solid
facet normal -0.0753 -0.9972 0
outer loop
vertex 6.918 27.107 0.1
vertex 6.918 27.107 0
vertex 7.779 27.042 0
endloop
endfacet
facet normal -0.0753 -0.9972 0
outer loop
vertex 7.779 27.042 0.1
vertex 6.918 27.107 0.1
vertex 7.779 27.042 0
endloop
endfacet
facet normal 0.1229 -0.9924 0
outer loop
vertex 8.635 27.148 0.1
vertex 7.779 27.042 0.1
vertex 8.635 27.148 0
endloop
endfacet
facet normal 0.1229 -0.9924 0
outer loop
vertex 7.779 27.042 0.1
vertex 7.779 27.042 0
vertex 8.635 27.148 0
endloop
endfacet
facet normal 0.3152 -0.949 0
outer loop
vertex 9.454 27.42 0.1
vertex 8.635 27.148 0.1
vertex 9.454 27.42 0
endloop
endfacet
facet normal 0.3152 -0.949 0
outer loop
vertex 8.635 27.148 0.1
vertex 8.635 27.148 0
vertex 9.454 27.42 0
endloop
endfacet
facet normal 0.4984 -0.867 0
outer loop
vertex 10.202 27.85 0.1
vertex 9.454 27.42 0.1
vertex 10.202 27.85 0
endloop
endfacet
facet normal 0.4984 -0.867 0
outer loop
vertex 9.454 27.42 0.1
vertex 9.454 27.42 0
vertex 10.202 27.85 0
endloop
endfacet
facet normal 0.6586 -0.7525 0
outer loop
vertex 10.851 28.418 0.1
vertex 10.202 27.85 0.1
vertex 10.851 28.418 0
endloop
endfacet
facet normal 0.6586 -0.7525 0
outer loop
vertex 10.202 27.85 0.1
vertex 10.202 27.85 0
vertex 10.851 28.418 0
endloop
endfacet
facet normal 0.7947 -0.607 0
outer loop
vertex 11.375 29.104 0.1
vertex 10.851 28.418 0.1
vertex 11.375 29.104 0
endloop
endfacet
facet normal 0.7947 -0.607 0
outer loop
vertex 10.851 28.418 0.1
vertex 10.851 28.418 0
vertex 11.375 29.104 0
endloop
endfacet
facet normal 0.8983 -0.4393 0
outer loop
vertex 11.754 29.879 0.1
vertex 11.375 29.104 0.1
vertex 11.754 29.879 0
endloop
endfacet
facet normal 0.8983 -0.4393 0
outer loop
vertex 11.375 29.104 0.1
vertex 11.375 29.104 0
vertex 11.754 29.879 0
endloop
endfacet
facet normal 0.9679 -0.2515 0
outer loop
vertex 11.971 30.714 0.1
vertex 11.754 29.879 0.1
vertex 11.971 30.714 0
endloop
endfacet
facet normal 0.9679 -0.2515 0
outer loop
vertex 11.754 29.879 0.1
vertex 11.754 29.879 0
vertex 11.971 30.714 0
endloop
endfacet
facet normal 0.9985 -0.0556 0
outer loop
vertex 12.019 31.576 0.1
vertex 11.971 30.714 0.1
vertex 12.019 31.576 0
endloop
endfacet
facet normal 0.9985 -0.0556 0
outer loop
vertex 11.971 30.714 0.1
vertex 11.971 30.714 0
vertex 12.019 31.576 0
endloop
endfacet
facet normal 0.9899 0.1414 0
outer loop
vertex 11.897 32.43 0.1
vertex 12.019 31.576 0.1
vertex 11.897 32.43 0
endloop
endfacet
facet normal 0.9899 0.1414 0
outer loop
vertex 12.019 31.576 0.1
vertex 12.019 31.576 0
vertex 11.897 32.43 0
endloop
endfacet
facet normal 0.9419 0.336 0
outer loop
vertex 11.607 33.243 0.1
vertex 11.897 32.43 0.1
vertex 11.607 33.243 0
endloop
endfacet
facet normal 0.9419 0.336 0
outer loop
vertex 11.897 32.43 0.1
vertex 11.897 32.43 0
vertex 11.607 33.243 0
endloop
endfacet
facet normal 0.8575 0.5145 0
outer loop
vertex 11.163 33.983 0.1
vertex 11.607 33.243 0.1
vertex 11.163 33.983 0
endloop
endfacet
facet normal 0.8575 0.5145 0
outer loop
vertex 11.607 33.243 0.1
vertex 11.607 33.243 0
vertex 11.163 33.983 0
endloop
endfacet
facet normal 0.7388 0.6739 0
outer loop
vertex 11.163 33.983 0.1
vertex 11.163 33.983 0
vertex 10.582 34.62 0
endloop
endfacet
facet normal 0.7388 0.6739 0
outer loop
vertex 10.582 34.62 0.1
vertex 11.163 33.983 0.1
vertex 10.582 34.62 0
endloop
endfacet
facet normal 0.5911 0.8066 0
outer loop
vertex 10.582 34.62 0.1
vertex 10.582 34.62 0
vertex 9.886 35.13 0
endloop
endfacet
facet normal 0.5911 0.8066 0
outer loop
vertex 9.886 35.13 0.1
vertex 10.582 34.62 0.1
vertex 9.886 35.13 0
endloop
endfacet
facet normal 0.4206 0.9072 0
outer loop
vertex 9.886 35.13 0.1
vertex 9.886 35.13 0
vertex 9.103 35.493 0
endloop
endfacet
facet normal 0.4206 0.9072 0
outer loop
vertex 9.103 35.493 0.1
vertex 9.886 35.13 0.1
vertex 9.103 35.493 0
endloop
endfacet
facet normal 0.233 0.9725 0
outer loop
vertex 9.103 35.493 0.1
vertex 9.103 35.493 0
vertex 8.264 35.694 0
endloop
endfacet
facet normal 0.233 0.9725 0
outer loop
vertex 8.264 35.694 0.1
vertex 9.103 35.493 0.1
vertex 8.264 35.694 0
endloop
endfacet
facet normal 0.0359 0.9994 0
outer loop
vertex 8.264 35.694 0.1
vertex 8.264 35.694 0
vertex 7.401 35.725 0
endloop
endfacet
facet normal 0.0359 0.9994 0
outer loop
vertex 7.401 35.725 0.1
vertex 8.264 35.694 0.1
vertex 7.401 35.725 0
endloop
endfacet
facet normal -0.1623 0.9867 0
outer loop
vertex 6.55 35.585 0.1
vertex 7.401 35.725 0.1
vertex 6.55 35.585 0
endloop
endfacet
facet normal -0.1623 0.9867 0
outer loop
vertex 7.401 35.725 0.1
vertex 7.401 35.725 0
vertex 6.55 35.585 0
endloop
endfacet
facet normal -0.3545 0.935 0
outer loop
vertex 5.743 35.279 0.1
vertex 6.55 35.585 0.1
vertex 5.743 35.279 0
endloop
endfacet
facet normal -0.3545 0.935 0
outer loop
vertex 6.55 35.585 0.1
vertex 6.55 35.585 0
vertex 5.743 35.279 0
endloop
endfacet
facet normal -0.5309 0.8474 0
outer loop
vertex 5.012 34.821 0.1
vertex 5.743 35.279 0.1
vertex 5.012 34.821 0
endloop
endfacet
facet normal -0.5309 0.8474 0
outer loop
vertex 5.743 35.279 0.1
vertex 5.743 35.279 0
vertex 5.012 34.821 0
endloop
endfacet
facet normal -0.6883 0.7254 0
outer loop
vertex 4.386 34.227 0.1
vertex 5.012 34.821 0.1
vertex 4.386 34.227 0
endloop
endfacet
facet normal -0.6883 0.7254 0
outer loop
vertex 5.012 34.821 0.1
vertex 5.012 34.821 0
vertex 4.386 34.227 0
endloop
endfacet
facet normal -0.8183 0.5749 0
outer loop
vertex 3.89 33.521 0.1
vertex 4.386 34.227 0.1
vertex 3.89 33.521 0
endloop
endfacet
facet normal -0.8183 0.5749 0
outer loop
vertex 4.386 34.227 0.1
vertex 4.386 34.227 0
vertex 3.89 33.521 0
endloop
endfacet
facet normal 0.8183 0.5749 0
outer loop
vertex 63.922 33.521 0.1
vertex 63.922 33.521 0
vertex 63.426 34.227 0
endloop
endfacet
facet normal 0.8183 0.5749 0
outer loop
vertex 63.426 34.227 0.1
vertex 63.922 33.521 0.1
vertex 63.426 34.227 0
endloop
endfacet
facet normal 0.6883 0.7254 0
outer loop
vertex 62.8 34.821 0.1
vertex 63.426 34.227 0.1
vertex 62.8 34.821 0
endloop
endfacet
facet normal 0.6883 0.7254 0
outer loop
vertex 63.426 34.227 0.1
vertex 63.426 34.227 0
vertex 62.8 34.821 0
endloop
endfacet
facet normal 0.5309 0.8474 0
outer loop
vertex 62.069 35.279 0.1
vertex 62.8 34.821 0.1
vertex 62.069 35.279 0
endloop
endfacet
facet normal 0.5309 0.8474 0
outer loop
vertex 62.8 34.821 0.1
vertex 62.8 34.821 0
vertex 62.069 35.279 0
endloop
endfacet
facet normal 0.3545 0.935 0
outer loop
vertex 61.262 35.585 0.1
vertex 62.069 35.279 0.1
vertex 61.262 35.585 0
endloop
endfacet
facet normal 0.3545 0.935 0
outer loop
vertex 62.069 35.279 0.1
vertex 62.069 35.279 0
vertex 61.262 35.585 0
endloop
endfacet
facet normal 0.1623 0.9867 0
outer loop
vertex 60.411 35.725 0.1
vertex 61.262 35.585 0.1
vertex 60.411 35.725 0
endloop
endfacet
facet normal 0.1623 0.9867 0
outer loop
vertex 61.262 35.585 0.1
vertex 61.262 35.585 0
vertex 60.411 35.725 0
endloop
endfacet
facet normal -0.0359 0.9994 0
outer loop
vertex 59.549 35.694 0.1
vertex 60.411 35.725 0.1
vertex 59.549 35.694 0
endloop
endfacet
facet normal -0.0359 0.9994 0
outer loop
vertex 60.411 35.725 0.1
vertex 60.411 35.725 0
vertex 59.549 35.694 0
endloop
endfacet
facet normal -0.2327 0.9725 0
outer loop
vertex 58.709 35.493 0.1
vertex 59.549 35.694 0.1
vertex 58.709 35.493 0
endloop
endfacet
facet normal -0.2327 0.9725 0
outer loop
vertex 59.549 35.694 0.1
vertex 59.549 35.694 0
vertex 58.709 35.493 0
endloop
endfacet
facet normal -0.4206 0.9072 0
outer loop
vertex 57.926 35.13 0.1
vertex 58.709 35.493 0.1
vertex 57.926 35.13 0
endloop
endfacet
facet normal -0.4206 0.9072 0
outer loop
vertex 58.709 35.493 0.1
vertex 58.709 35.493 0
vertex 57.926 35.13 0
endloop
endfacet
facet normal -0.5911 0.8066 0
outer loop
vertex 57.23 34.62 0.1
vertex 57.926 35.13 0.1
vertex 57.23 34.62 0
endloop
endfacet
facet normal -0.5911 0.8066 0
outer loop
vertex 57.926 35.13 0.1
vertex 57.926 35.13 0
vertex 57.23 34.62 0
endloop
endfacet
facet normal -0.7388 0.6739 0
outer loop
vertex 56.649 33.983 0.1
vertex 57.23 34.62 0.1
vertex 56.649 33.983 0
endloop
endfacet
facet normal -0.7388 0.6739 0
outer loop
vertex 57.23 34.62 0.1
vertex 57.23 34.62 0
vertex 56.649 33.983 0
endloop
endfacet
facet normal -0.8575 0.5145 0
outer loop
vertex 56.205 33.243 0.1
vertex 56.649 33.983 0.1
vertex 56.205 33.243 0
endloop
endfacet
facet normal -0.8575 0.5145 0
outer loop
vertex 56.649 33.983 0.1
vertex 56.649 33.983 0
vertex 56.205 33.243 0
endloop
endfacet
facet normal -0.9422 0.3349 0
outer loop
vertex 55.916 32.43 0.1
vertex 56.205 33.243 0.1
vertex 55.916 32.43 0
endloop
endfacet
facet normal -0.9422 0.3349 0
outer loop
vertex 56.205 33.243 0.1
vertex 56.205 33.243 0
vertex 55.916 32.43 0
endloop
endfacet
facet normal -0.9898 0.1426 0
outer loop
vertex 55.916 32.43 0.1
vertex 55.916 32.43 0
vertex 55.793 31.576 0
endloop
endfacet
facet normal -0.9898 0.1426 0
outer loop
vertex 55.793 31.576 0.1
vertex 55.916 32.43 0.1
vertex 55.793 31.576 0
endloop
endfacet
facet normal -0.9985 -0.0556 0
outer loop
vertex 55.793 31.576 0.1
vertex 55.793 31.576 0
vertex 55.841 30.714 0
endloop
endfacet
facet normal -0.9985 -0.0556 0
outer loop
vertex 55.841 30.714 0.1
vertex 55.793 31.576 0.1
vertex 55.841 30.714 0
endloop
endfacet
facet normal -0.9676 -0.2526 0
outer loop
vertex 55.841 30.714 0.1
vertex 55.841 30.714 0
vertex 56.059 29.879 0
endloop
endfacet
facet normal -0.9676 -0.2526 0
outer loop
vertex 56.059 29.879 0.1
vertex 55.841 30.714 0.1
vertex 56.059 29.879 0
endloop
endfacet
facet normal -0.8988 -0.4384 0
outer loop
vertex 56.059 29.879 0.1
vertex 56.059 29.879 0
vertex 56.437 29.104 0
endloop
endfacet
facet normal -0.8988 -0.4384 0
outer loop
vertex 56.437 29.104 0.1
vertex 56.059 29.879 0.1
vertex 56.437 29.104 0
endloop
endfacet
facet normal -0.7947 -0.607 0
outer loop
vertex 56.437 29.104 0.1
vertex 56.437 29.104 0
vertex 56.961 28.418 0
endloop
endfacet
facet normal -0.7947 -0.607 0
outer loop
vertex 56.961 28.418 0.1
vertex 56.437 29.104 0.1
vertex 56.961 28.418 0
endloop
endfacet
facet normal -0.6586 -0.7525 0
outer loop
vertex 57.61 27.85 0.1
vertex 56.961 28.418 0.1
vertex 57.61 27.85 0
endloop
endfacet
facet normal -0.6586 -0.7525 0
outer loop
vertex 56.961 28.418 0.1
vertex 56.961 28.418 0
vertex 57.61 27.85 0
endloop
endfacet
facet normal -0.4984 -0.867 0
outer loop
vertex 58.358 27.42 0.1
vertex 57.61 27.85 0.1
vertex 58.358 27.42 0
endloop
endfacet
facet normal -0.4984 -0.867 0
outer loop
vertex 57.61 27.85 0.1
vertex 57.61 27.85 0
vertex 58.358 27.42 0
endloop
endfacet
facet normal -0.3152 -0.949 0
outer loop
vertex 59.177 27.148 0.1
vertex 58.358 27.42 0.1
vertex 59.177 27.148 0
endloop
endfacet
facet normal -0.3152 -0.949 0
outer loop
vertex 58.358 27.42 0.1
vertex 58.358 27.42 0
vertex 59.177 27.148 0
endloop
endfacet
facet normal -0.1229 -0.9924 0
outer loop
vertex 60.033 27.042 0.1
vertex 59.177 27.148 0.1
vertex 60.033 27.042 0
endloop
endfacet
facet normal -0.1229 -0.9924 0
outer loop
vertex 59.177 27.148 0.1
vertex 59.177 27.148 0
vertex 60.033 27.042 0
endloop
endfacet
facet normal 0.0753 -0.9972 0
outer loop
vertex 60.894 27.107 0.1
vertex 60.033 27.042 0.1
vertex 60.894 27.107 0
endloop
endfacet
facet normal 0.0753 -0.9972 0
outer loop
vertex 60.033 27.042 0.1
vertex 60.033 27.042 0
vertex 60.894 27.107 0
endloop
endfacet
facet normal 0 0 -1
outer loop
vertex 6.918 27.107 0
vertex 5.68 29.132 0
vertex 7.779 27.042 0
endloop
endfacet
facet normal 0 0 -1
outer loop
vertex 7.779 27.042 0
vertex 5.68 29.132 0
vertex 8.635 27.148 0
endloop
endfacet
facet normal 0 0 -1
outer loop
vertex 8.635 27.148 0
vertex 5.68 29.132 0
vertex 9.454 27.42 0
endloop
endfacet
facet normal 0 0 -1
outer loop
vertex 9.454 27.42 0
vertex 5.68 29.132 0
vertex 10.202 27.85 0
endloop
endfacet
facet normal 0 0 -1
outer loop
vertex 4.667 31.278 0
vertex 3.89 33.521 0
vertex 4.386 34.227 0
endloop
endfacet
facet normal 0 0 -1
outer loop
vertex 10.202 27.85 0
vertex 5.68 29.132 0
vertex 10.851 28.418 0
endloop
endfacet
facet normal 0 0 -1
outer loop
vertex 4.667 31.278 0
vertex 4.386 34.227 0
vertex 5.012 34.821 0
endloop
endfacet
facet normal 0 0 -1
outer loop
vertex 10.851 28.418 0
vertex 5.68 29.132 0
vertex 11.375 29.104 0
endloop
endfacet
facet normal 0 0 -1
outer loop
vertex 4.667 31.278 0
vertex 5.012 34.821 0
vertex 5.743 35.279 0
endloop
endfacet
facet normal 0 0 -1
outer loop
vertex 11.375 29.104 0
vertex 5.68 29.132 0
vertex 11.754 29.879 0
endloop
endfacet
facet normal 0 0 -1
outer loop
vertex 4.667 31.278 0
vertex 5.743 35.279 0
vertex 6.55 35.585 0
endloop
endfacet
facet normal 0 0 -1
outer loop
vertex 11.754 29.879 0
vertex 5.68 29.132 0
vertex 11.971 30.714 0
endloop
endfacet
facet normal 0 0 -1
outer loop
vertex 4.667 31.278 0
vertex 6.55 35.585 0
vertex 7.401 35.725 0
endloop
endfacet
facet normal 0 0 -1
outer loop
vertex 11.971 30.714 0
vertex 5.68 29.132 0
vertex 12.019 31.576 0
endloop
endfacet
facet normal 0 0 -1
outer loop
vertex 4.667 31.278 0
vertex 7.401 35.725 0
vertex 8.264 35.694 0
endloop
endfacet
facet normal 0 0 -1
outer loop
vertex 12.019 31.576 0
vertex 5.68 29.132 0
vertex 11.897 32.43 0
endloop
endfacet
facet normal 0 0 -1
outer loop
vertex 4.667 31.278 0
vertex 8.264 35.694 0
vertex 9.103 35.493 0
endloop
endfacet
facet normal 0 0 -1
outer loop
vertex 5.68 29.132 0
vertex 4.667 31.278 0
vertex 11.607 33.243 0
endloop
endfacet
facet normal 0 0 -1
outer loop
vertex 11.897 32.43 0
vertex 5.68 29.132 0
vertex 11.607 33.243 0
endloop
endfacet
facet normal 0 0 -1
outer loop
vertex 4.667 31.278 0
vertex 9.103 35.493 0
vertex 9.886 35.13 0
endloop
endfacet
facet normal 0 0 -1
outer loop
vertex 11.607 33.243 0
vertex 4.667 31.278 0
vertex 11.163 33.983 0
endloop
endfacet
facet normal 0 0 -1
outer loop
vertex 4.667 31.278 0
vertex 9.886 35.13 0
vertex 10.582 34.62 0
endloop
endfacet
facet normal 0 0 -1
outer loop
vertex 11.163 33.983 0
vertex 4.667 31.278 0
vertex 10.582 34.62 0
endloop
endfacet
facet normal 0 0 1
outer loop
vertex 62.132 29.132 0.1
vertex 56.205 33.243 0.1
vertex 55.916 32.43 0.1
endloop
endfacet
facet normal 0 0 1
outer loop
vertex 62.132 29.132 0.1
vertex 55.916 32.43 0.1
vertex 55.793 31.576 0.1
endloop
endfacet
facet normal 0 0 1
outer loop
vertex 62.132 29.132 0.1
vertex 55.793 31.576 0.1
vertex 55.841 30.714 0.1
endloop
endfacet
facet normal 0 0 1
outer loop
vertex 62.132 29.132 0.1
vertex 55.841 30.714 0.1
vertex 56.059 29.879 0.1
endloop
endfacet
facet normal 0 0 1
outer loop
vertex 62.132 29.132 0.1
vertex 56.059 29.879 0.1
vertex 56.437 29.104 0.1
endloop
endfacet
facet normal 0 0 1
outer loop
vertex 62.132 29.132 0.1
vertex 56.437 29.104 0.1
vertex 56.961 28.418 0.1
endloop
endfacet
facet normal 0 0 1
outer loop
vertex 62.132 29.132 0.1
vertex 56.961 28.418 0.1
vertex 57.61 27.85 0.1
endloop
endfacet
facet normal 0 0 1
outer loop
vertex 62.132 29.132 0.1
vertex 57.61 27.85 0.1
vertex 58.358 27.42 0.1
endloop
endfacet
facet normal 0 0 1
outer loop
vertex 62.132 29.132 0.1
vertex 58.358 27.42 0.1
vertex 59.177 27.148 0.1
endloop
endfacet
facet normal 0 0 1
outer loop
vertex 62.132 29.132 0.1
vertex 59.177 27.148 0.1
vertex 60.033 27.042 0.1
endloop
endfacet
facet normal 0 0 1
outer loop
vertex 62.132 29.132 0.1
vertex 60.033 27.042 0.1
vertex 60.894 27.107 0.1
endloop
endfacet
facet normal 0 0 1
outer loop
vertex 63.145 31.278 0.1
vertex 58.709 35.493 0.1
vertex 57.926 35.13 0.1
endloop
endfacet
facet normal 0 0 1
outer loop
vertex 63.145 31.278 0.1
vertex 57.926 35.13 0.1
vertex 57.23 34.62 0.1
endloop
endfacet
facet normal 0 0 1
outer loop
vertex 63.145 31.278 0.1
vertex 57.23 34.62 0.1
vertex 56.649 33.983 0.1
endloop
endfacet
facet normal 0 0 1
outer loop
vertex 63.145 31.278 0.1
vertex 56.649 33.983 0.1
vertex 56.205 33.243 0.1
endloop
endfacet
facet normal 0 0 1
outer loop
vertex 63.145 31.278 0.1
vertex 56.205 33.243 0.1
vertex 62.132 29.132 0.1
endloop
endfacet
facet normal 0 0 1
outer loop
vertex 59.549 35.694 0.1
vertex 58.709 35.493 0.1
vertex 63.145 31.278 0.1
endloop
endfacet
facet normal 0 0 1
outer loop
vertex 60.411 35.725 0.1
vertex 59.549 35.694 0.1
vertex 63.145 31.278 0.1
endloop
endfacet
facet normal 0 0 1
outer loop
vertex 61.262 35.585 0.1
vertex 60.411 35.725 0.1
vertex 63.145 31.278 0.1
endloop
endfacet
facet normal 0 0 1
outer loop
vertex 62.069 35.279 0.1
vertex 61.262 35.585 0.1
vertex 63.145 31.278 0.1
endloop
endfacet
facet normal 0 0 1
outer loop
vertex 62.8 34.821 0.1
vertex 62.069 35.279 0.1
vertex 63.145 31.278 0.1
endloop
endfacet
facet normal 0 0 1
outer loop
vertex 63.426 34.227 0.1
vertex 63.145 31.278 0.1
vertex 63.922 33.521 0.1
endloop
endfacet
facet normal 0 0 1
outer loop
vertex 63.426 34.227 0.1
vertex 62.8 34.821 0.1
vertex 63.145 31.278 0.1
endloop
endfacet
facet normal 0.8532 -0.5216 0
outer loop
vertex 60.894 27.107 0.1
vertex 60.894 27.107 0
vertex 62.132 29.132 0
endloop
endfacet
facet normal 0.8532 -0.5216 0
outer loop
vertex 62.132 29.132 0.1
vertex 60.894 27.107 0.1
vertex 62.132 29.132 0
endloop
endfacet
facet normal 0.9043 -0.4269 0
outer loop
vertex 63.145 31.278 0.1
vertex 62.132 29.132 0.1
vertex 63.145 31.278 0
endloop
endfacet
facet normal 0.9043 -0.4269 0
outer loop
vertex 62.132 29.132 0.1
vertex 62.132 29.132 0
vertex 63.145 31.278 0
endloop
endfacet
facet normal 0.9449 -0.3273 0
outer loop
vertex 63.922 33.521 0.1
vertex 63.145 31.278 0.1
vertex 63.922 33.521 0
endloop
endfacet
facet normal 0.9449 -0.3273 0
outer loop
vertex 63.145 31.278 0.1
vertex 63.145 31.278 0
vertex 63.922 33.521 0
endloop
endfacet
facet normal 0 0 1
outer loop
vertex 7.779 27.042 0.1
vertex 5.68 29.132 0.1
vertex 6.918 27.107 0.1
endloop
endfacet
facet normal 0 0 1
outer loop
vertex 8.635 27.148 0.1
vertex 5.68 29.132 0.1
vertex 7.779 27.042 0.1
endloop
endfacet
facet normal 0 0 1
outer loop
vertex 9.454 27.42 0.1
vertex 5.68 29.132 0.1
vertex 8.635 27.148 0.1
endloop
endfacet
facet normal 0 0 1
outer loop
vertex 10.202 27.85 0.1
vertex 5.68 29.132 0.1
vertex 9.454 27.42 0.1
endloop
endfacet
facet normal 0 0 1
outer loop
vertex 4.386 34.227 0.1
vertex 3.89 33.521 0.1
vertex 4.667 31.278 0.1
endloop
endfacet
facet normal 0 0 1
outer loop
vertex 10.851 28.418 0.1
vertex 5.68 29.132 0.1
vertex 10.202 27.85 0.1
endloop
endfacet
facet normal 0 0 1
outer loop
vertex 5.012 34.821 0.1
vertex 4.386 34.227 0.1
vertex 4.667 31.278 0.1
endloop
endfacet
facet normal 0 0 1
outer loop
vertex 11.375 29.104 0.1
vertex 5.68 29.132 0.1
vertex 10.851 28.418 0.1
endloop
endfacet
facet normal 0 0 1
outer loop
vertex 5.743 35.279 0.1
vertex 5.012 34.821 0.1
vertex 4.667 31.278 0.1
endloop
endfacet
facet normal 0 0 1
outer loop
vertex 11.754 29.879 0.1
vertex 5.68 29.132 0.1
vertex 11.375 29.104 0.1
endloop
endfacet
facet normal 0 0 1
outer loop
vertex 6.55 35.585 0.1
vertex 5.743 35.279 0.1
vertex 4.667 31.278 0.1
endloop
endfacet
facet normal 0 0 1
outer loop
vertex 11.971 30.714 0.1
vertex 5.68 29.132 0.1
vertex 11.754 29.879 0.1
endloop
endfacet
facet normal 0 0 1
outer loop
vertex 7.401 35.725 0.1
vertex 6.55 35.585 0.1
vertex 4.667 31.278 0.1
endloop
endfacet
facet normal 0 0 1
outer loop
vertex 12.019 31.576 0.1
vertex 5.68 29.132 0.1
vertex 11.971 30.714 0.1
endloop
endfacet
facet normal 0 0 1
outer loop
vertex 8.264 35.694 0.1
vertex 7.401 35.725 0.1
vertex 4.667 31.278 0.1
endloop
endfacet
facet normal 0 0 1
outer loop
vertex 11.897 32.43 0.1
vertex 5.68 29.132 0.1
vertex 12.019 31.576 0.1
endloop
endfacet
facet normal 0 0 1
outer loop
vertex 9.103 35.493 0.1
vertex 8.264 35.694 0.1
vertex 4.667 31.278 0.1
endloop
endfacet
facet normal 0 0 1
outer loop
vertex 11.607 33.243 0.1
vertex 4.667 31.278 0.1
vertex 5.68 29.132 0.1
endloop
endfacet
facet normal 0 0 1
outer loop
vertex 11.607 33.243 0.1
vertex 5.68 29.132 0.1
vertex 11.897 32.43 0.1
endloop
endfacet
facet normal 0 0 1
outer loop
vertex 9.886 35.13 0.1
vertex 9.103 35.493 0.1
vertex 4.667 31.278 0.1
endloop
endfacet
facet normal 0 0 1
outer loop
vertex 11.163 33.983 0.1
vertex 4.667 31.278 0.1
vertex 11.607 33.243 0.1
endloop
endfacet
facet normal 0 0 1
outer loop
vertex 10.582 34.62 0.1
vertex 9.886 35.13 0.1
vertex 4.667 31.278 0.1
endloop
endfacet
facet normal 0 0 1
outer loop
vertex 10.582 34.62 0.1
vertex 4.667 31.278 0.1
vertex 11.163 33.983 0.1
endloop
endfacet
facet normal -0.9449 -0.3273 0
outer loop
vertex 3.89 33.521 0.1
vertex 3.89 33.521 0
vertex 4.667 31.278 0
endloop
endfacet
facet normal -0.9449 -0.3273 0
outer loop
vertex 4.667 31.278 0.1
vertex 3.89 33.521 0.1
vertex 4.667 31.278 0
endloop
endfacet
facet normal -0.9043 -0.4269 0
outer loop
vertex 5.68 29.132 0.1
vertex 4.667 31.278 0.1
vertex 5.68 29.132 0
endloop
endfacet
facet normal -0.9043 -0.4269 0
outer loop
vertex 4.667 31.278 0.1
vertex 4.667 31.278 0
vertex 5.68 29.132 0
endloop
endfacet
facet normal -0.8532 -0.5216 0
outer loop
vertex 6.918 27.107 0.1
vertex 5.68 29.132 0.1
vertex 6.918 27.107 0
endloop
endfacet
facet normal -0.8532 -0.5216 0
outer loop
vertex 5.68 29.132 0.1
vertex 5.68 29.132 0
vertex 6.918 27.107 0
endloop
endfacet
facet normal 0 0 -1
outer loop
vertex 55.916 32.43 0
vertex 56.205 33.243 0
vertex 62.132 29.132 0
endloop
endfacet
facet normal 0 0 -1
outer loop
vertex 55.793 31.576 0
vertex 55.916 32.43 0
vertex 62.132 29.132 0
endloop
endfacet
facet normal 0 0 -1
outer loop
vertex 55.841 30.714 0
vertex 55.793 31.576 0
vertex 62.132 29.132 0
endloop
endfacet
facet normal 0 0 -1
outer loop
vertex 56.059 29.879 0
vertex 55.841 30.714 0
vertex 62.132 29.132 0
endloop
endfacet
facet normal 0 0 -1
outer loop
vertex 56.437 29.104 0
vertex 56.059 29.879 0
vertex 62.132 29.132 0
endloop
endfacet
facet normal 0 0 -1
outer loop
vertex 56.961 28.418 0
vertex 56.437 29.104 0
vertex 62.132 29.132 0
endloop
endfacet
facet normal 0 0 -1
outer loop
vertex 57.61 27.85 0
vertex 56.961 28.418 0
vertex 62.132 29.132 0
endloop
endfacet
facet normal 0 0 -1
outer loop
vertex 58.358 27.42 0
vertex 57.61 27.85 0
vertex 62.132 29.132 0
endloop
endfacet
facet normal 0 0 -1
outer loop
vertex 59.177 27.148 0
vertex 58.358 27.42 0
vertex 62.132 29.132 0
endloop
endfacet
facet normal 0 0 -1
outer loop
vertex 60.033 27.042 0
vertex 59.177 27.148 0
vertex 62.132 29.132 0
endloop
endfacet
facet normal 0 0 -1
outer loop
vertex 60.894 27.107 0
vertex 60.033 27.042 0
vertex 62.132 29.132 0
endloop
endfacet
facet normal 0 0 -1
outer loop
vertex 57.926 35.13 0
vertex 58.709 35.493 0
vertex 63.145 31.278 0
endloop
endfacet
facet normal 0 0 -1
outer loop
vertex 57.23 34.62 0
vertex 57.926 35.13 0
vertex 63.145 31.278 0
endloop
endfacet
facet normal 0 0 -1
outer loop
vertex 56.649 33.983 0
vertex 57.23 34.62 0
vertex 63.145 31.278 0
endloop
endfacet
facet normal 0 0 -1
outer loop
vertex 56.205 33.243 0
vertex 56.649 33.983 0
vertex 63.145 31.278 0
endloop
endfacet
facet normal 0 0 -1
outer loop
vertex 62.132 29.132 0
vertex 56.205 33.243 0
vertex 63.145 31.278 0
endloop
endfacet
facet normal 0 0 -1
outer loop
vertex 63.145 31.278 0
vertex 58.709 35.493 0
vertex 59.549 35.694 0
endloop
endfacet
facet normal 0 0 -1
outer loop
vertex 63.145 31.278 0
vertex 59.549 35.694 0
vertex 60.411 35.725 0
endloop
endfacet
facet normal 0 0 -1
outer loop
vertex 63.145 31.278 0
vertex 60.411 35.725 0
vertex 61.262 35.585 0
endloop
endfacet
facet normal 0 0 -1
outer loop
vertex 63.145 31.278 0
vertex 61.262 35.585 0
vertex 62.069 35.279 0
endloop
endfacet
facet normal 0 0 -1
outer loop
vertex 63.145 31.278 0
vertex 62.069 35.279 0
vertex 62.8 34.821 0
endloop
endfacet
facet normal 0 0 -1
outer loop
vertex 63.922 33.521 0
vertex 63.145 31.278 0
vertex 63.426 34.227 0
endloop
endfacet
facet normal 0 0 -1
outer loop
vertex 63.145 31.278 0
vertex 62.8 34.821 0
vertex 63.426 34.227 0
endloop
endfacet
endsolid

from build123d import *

# Parameters (mm, degrees)
SALIENTE_EXTRUIR1_DEPTH   = 0.1
SALIENTE_EXTRUIR1_2_DEPTH = 0.1


with BuildPart() as part:
    # Model → Saliente-Extruir1 (new body)
    with BuildSketch(Plane.XY):
        with BuildLine():
            ThreePointArc((3.890171253, 33.520517491), (5.144616973, 30.191270124), (6.918449363, 27.107272596))
            ThreePointArc((6.918449363, 27.107272596), (11.607345034, 33.242913751), (3.890171253, 33.520517491))
        make_face()
    extrude(amount=SALIENTE_EXTRUIR1_DEPTH)


with BuildPart() as body_2:
    # Model → Saliente-Extruir1 2 (new body)
    with BuildSketch(Plane.XY):
        with BuildLine():
            ThreePointArc((60.893838912, 27.107272596), (62.667671302, 30.191270124), (63.922117021, 33.520517491))
            ThreePointArc((63.922117021, 33.520517491), (56.204943241, 33.242913751), (60.893838912, 27.107272596))
        make_face()
    extrude(amount=SALIENTE_EXTRUIR1_2_DEPTH)


solid = Compound([part.part, body_2.part])
